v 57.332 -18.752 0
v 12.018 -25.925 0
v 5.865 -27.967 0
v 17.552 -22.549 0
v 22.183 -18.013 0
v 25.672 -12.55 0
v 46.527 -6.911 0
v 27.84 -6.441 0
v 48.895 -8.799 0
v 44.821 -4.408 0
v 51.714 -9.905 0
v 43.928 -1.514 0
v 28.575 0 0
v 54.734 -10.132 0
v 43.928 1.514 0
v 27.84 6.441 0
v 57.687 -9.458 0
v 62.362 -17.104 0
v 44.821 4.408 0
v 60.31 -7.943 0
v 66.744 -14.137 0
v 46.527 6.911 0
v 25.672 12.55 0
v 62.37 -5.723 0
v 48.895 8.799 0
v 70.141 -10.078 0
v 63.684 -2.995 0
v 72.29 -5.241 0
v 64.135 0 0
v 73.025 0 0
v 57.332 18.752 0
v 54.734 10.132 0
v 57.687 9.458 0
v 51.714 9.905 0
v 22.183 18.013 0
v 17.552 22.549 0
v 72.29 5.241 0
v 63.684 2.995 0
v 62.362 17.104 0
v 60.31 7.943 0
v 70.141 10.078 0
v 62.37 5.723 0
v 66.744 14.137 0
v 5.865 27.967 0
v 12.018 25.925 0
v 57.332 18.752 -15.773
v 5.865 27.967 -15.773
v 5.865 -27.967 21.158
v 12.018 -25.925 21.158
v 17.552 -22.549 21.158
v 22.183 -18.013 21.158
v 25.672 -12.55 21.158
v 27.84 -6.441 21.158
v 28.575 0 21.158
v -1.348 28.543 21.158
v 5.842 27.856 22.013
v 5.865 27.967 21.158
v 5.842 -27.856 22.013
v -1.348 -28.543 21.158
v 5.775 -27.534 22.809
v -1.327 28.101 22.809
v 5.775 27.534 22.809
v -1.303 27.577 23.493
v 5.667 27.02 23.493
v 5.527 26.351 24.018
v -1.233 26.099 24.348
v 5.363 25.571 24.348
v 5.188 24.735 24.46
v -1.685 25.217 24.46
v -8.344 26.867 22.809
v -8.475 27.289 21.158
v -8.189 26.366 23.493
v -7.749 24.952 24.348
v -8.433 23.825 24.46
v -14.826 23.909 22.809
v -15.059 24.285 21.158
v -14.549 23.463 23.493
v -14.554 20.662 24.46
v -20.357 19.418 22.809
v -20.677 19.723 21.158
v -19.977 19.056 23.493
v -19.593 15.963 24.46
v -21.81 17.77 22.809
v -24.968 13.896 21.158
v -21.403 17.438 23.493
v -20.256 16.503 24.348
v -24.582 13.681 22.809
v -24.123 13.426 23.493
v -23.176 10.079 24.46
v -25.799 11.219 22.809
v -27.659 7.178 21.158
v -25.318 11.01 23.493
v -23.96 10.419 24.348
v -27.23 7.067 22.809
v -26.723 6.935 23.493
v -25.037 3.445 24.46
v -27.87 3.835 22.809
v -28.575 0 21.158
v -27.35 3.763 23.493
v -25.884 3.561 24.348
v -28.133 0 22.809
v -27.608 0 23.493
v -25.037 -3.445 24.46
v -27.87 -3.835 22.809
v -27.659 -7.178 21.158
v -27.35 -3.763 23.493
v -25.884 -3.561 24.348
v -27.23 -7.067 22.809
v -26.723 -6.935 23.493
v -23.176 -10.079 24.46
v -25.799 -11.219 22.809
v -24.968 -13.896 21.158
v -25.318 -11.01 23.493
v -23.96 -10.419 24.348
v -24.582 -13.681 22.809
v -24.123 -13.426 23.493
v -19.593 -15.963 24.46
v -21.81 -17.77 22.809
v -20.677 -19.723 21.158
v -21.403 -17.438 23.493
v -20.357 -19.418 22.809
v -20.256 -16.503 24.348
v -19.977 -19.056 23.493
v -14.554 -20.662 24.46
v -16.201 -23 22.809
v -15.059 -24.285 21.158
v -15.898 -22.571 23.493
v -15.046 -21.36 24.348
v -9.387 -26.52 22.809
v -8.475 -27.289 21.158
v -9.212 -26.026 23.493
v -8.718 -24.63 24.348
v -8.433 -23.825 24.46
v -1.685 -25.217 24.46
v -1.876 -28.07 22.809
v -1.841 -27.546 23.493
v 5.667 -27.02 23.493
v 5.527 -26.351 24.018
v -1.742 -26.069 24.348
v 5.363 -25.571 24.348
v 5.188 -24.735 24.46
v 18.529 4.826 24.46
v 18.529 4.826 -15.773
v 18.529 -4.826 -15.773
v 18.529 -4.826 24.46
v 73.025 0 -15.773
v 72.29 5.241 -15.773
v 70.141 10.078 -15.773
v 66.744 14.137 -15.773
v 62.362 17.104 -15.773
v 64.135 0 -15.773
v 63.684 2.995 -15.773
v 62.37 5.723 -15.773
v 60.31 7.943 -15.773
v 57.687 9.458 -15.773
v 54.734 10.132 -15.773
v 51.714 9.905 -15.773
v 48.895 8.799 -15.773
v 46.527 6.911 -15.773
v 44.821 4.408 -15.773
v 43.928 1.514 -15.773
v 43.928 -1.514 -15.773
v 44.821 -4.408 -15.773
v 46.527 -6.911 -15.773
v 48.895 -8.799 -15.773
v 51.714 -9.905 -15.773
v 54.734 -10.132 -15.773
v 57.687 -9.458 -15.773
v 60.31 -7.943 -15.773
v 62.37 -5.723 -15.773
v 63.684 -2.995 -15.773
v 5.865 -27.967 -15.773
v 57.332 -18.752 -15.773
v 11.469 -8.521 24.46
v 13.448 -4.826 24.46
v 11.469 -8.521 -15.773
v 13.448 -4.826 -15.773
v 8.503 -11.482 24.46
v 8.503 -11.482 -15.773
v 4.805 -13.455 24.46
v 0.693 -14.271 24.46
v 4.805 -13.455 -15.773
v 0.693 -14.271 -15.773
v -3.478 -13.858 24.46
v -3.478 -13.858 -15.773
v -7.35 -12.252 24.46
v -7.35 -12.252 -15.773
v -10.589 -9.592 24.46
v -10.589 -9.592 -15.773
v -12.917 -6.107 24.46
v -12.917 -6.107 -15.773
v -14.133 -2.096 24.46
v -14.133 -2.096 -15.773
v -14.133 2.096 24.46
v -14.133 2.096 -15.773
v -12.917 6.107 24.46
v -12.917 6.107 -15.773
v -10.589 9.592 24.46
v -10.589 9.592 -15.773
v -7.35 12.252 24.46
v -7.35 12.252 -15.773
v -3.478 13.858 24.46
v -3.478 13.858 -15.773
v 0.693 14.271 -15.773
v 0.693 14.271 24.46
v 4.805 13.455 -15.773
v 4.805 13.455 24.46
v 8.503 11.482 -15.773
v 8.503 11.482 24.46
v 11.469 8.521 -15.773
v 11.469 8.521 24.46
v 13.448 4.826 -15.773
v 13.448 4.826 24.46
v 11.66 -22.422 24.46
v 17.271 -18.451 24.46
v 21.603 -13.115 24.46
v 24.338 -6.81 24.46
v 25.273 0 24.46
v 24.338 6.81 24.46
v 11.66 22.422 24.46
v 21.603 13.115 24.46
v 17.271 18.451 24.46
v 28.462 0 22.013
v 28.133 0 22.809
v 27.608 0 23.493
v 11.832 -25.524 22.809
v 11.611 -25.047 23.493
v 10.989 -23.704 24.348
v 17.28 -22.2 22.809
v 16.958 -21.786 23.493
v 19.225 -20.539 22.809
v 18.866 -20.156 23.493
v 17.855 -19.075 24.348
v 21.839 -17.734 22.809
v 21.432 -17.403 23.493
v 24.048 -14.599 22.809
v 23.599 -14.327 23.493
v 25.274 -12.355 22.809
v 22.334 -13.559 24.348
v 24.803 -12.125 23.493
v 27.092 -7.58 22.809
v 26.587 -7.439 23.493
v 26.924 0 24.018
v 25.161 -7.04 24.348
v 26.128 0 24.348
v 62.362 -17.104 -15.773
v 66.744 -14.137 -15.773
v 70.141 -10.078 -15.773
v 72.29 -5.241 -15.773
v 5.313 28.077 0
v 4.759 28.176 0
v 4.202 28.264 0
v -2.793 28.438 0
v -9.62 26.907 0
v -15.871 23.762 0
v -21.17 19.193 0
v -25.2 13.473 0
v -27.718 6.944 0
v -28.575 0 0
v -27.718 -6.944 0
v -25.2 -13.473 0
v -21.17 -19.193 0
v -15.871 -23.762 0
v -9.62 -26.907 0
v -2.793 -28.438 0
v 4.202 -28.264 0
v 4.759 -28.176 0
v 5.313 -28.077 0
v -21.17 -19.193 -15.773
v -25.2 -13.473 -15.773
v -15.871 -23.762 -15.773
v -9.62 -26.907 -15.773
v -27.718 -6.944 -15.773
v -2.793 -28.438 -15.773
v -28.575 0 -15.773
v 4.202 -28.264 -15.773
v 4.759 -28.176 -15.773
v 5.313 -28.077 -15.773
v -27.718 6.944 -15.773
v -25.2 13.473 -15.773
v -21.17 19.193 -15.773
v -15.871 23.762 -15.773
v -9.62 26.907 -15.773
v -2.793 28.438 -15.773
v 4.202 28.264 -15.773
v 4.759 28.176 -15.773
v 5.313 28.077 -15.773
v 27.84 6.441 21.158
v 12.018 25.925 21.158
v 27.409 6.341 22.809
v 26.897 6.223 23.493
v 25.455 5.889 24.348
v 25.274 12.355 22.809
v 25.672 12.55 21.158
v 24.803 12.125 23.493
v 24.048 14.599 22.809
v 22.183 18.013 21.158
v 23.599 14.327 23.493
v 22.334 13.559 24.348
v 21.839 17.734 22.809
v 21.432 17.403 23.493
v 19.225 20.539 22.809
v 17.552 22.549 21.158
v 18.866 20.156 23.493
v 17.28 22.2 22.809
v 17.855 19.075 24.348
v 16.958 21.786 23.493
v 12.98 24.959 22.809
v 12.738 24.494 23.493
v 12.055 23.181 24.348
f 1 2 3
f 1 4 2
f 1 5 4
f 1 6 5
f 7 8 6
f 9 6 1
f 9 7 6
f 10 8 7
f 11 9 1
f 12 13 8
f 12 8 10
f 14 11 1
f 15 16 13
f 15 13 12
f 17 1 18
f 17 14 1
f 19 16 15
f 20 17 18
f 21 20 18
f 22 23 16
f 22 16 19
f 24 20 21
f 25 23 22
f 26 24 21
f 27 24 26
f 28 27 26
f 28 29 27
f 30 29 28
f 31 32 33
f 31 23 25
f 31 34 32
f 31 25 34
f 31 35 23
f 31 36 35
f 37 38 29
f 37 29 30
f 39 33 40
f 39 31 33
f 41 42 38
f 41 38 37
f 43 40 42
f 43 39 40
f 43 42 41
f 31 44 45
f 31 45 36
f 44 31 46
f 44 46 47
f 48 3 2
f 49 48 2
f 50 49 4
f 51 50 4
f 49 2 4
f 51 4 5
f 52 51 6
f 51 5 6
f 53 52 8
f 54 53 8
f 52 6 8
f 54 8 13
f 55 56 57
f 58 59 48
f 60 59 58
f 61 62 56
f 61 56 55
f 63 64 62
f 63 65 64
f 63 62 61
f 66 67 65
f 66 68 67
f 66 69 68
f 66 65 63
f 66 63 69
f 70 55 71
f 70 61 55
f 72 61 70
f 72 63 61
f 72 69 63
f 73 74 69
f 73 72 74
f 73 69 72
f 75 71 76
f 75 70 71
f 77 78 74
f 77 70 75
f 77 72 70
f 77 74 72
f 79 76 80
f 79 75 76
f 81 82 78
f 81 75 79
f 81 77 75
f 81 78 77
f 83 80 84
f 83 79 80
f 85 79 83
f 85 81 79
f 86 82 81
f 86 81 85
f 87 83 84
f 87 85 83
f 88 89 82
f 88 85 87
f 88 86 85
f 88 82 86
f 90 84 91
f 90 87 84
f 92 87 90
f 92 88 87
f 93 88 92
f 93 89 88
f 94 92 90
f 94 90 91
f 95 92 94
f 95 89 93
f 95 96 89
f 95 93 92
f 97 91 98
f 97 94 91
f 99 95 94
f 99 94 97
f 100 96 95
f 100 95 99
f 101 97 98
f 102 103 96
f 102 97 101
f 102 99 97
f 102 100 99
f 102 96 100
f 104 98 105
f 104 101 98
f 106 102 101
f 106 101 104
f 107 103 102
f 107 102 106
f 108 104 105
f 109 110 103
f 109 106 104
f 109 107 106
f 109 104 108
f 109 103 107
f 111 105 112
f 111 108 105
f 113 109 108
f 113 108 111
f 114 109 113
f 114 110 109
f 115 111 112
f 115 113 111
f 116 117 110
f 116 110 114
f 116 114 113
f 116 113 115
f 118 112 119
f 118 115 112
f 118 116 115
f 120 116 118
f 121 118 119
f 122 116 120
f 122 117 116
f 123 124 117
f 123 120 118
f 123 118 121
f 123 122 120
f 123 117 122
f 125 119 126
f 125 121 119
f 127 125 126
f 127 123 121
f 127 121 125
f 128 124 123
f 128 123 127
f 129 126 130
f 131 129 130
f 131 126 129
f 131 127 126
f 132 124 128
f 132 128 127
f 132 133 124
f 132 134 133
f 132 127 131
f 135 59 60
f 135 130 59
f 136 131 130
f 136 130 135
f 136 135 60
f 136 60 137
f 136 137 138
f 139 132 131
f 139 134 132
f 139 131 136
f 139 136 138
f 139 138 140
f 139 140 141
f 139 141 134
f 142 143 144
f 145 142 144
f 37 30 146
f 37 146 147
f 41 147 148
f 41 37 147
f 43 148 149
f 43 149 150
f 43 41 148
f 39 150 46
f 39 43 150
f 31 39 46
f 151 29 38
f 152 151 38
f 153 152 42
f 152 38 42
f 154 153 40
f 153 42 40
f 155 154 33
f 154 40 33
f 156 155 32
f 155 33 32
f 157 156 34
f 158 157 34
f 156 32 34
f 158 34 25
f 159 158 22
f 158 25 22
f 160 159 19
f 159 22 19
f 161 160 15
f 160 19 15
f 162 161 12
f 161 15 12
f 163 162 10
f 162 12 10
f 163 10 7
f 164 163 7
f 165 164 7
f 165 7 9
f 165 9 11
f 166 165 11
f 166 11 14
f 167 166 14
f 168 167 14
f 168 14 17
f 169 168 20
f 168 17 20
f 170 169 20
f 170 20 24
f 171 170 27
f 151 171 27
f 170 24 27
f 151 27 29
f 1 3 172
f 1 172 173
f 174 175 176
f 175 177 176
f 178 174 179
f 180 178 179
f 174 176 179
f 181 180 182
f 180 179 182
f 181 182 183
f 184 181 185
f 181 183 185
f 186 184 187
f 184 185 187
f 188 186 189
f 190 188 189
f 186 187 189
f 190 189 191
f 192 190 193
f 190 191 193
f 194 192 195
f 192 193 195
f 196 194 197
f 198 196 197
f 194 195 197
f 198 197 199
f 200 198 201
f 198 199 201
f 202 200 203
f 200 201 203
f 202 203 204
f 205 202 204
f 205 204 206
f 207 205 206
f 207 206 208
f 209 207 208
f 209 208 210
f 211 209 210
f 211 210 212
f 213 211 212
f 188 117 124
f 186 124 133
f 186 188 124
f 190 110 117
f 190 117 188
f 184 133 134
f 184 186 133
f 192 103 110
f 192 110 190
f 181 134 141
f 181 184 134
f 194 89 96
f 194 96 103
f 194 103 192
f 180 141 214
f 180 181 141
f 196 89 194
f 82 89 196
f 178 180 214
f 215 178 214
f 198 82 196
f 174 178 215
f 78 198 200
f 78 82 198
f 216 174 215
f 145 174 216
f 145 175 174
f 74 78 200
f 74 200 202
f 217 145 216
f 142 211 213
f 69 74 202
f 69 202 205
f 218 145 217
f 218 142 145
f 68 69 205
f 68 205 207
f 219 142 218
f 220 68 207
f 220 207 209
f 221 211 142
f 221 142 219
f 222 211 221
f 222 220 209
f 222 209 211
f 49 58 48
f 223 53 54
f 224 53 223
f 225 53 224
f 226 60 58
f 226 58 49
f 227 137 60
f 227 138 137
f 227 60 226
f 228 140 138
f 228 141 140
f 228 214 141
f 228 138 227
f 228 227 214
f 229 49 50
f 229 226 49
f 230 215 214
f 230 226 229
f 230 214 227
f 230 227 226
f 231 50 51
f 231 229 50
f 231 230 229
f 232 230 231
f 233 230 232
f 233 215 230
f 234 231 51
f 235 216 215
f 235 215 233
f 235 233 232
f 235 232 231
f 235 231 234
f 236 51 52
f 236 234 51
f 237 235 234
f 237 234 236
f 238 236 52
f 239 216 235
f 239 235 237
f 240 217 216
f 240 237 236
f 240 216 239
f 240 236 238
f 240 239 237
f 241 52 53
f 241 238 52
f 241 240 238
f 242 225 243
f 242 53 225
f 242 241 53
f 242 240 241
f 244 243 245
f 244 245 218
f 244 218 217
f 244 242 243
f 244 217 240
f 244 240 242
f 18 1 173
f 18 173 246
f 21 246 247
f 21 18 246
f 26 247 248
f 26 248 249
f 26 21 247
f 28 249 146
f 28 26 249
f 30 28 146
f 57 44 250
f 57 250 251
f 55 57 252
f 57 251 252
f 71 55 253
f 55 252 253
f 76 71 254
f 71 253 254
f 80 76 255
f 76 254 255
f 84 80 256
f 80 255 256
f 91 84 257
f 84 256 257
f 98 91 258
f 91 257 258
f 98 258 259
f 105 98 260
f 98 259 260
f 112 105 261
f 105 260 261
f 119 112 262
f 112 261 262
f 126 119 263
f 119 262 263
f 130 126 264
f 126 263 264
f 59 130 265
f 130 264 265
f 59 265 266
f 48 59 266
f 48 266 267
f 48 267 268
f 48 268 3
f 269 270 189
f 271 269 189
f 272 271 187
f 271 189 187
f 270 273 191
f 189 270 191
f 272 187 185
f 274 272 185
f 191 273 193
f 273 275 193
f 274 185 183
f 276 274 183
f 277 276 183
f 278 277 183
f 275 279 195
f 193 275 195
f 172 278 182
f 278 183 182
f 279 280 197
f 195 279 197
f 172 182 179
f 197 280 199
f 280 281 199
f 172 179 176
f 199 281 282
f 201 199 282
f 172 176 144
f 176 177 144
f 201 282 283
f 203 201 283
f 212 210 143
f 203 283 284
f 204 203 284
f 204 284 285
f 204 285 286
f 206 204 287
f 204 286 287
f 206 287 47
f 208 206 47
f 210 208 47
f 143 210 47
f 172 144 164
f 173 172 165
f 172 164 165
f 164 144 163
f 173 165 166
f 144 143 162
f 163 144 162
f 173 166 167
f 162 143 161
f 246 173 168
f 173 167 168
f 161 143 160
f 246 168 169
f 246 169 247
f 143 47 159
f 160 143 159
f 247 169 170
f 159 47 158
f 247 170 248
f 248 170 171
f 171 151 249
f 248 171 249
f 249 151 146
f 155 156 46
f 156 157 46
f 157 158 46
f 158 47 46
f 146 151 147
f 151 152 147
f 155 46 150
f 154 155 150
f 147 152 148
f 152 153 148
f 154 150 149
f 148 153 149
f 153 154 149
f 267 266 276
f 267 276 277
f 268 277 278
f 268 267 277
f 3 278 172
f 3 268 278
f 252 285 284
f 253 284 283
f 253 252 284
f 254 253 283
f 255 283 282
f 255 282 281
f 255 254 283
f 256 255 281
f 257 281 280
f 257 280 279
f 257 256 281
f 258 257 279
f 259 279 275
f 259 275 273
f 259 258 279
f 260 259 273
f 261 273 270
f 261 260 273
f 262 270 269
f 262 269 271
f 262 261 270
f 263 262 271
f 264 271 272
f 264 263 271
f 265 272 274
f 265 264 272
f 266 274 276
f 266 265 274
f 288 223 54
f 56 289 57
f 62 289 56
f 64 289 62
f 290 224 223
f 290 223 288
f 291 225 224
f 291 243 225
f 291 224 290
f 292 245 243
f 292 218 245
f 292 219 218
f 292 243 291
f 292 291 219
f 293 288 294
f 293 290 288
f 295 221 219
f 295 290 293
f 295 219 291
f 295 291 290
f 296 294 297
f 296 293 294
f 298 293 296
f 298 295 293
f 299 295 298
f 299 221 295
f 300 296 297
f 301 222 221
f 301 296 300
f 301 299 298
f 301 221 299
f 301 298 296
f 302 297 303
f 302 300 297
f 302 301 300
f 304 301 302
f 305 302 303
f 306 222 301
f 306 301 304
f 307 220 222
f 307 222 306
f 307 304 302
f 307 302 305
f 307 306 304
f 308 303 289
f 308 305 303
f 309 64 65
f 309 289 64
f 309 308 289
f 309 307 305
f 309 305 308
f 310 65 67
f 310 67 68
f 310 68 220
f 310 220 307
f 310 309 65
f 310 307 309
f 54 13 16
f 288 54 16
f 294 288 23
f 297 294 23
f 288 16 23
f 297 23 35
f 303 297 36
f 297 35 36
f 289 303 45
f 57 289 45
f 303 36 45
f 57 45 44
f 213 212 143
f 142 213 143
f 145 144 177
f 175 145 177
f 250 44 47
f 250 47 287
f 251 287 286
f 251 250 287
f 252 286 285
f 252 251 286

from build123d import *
from build123d import SkipClean  # not in build123d's __all__

# Parameters (mm, degrees)
F0_R     = 10.16
F1_DEPTH = 15.7734
F3_DEPTH = 24.4602
F4_R     = 3.302


with BuildPart() as f1:
    # F0 (on Top) → F1 (new body)
    with BuildSketch(Plane.XY):
        with BuildLine():
            Line((5.865458004, 27.9665340613), (4.2022058824, 28.2643254072))
            ThreePointArc((4.2022058824, 28.2643254072), (-28.575, 0), (4.2022058824, -28.2643254072))
            Line((4.2022058824, -28.2643254072), (5.865458004, -27.9665340613))
            ThreePointArc((5.865458004, -27.9665340613), (22.182606784, -18.0128448966), (28.575, 0))
            ThreePointArc((28.575, 0), (22.182606784, 18.0128448966), (5.865458004, 27.9665340613))
        make_face()
        with BuildLine():
            ThreePointArc((13.4477648793, -4.826), (-14.2875, 0), (13.4477648793, 4.826))
            Line((13.4477648793, 4.826), (18.5293, 4.826))
            Line((18.5293, 4.826), (18.5293, -4.826))
            Line((18.5293, -4.826), (13.4477648793, -4.826))
        make_face(mode=Mode.SUBTRACT)
        with BuildLine():
            ThreePointArc((5.865458004, 27.9665340613), (5.0360335537, 28.1277263753), (4.2022058824, 28.2643254072))
            Line((4.2022058824, 28.2643254072), (5.865458004, 27.9665340613))
        make_face()
        with BuildLine():
            Line((5.865458004, -27.9665340613), (4.2022058824, -28.2643254072))
            ThreePointArc((4.2022058824, -28.2643254072), (5.0360335537, -28.1277263753), (5.865458004, -27.9665340613))
        make_face()
        with BuildLine():
            Line((57.3323557024, 18.7518175836), (5.865458004, 27.9665340613))
            ThreePointArc((5.865458004, 27.9665340613), (22.182606784, 18.0128448966), (28.575, 0))
            ThreePointArc((28.575, 0), (22.182606784, -18.0128448966), (5.865458004, -27.9665340613))
            Line((5.865458004, -27.9665340613), (57.3323557024, -18.7518175836))
            ThreePointArc((57.3323557024, -18.7518175836), (34.925, 0), (57.3323557024, 18.7518175836))
        make_face()
        with BuildLine():
            ThreePointArc((73.025, 0), (68.5842458076, 12.2258920711), (57.3323557024, 18.7518175836))
            ThreePointArc((57.3323557024, 18.7518175836), (34.925, 0), (57.3323557024, -18.7518175836))
            ThreePointArc((57.3323557024, -18.7518175836), (68.5842458076, -12.2258920711), (73.025, 0))
        make_face()
        with Locations((53.975, 0)):
            Circle(F0_R, mode=Mode.SUBTRACT)
    extrude(amount=-F1_DEPTH)

    # F2 (on face) → F3 (join)
    with BuildSketch(Plane.XY):
        with BuildLine():
            ThreePointArc((28.575, 0), (22.182606784, 18.0128448966), (5.865458004, 27.9665340613))
            ThreePointArc((5.865458004, 27.9665340613), (-28.575, 0), (5.865458004, -27.9665340613))
            ThreePointArc((5.865458004, -27.9665340613), (22.182606784, -18.0128448966), (28.575, 0))
        make_face()
        with BuildLine():
            ThreePointArc((13.4477648793, -4.826), (-14.2875, 0), (13.4477648793, 4.826))
            Line((13.4477648793, 4.826), (18.5293, 4.826))
            Line((18.5293, 4.826), (18.5293, -4.826))
            Line((18.5293, -4.826), (13.4477648793, -4.826))
        make_face(mode=Mode.SUBTRACT)
    with SkipClean():  # cleaning this boolean's faces spoils the solid; the shape is the same uncleaned
        extrude(amount=F3_DEPTH)

    # F4
    f4_edges = [f1.edges().sort_by_distance(p)[0] for p in [
        (-5.865458, 27.966534, 24.4602),
    ]]
    fillet(f4_edges, radius=F4_R)


solid = f1.part
